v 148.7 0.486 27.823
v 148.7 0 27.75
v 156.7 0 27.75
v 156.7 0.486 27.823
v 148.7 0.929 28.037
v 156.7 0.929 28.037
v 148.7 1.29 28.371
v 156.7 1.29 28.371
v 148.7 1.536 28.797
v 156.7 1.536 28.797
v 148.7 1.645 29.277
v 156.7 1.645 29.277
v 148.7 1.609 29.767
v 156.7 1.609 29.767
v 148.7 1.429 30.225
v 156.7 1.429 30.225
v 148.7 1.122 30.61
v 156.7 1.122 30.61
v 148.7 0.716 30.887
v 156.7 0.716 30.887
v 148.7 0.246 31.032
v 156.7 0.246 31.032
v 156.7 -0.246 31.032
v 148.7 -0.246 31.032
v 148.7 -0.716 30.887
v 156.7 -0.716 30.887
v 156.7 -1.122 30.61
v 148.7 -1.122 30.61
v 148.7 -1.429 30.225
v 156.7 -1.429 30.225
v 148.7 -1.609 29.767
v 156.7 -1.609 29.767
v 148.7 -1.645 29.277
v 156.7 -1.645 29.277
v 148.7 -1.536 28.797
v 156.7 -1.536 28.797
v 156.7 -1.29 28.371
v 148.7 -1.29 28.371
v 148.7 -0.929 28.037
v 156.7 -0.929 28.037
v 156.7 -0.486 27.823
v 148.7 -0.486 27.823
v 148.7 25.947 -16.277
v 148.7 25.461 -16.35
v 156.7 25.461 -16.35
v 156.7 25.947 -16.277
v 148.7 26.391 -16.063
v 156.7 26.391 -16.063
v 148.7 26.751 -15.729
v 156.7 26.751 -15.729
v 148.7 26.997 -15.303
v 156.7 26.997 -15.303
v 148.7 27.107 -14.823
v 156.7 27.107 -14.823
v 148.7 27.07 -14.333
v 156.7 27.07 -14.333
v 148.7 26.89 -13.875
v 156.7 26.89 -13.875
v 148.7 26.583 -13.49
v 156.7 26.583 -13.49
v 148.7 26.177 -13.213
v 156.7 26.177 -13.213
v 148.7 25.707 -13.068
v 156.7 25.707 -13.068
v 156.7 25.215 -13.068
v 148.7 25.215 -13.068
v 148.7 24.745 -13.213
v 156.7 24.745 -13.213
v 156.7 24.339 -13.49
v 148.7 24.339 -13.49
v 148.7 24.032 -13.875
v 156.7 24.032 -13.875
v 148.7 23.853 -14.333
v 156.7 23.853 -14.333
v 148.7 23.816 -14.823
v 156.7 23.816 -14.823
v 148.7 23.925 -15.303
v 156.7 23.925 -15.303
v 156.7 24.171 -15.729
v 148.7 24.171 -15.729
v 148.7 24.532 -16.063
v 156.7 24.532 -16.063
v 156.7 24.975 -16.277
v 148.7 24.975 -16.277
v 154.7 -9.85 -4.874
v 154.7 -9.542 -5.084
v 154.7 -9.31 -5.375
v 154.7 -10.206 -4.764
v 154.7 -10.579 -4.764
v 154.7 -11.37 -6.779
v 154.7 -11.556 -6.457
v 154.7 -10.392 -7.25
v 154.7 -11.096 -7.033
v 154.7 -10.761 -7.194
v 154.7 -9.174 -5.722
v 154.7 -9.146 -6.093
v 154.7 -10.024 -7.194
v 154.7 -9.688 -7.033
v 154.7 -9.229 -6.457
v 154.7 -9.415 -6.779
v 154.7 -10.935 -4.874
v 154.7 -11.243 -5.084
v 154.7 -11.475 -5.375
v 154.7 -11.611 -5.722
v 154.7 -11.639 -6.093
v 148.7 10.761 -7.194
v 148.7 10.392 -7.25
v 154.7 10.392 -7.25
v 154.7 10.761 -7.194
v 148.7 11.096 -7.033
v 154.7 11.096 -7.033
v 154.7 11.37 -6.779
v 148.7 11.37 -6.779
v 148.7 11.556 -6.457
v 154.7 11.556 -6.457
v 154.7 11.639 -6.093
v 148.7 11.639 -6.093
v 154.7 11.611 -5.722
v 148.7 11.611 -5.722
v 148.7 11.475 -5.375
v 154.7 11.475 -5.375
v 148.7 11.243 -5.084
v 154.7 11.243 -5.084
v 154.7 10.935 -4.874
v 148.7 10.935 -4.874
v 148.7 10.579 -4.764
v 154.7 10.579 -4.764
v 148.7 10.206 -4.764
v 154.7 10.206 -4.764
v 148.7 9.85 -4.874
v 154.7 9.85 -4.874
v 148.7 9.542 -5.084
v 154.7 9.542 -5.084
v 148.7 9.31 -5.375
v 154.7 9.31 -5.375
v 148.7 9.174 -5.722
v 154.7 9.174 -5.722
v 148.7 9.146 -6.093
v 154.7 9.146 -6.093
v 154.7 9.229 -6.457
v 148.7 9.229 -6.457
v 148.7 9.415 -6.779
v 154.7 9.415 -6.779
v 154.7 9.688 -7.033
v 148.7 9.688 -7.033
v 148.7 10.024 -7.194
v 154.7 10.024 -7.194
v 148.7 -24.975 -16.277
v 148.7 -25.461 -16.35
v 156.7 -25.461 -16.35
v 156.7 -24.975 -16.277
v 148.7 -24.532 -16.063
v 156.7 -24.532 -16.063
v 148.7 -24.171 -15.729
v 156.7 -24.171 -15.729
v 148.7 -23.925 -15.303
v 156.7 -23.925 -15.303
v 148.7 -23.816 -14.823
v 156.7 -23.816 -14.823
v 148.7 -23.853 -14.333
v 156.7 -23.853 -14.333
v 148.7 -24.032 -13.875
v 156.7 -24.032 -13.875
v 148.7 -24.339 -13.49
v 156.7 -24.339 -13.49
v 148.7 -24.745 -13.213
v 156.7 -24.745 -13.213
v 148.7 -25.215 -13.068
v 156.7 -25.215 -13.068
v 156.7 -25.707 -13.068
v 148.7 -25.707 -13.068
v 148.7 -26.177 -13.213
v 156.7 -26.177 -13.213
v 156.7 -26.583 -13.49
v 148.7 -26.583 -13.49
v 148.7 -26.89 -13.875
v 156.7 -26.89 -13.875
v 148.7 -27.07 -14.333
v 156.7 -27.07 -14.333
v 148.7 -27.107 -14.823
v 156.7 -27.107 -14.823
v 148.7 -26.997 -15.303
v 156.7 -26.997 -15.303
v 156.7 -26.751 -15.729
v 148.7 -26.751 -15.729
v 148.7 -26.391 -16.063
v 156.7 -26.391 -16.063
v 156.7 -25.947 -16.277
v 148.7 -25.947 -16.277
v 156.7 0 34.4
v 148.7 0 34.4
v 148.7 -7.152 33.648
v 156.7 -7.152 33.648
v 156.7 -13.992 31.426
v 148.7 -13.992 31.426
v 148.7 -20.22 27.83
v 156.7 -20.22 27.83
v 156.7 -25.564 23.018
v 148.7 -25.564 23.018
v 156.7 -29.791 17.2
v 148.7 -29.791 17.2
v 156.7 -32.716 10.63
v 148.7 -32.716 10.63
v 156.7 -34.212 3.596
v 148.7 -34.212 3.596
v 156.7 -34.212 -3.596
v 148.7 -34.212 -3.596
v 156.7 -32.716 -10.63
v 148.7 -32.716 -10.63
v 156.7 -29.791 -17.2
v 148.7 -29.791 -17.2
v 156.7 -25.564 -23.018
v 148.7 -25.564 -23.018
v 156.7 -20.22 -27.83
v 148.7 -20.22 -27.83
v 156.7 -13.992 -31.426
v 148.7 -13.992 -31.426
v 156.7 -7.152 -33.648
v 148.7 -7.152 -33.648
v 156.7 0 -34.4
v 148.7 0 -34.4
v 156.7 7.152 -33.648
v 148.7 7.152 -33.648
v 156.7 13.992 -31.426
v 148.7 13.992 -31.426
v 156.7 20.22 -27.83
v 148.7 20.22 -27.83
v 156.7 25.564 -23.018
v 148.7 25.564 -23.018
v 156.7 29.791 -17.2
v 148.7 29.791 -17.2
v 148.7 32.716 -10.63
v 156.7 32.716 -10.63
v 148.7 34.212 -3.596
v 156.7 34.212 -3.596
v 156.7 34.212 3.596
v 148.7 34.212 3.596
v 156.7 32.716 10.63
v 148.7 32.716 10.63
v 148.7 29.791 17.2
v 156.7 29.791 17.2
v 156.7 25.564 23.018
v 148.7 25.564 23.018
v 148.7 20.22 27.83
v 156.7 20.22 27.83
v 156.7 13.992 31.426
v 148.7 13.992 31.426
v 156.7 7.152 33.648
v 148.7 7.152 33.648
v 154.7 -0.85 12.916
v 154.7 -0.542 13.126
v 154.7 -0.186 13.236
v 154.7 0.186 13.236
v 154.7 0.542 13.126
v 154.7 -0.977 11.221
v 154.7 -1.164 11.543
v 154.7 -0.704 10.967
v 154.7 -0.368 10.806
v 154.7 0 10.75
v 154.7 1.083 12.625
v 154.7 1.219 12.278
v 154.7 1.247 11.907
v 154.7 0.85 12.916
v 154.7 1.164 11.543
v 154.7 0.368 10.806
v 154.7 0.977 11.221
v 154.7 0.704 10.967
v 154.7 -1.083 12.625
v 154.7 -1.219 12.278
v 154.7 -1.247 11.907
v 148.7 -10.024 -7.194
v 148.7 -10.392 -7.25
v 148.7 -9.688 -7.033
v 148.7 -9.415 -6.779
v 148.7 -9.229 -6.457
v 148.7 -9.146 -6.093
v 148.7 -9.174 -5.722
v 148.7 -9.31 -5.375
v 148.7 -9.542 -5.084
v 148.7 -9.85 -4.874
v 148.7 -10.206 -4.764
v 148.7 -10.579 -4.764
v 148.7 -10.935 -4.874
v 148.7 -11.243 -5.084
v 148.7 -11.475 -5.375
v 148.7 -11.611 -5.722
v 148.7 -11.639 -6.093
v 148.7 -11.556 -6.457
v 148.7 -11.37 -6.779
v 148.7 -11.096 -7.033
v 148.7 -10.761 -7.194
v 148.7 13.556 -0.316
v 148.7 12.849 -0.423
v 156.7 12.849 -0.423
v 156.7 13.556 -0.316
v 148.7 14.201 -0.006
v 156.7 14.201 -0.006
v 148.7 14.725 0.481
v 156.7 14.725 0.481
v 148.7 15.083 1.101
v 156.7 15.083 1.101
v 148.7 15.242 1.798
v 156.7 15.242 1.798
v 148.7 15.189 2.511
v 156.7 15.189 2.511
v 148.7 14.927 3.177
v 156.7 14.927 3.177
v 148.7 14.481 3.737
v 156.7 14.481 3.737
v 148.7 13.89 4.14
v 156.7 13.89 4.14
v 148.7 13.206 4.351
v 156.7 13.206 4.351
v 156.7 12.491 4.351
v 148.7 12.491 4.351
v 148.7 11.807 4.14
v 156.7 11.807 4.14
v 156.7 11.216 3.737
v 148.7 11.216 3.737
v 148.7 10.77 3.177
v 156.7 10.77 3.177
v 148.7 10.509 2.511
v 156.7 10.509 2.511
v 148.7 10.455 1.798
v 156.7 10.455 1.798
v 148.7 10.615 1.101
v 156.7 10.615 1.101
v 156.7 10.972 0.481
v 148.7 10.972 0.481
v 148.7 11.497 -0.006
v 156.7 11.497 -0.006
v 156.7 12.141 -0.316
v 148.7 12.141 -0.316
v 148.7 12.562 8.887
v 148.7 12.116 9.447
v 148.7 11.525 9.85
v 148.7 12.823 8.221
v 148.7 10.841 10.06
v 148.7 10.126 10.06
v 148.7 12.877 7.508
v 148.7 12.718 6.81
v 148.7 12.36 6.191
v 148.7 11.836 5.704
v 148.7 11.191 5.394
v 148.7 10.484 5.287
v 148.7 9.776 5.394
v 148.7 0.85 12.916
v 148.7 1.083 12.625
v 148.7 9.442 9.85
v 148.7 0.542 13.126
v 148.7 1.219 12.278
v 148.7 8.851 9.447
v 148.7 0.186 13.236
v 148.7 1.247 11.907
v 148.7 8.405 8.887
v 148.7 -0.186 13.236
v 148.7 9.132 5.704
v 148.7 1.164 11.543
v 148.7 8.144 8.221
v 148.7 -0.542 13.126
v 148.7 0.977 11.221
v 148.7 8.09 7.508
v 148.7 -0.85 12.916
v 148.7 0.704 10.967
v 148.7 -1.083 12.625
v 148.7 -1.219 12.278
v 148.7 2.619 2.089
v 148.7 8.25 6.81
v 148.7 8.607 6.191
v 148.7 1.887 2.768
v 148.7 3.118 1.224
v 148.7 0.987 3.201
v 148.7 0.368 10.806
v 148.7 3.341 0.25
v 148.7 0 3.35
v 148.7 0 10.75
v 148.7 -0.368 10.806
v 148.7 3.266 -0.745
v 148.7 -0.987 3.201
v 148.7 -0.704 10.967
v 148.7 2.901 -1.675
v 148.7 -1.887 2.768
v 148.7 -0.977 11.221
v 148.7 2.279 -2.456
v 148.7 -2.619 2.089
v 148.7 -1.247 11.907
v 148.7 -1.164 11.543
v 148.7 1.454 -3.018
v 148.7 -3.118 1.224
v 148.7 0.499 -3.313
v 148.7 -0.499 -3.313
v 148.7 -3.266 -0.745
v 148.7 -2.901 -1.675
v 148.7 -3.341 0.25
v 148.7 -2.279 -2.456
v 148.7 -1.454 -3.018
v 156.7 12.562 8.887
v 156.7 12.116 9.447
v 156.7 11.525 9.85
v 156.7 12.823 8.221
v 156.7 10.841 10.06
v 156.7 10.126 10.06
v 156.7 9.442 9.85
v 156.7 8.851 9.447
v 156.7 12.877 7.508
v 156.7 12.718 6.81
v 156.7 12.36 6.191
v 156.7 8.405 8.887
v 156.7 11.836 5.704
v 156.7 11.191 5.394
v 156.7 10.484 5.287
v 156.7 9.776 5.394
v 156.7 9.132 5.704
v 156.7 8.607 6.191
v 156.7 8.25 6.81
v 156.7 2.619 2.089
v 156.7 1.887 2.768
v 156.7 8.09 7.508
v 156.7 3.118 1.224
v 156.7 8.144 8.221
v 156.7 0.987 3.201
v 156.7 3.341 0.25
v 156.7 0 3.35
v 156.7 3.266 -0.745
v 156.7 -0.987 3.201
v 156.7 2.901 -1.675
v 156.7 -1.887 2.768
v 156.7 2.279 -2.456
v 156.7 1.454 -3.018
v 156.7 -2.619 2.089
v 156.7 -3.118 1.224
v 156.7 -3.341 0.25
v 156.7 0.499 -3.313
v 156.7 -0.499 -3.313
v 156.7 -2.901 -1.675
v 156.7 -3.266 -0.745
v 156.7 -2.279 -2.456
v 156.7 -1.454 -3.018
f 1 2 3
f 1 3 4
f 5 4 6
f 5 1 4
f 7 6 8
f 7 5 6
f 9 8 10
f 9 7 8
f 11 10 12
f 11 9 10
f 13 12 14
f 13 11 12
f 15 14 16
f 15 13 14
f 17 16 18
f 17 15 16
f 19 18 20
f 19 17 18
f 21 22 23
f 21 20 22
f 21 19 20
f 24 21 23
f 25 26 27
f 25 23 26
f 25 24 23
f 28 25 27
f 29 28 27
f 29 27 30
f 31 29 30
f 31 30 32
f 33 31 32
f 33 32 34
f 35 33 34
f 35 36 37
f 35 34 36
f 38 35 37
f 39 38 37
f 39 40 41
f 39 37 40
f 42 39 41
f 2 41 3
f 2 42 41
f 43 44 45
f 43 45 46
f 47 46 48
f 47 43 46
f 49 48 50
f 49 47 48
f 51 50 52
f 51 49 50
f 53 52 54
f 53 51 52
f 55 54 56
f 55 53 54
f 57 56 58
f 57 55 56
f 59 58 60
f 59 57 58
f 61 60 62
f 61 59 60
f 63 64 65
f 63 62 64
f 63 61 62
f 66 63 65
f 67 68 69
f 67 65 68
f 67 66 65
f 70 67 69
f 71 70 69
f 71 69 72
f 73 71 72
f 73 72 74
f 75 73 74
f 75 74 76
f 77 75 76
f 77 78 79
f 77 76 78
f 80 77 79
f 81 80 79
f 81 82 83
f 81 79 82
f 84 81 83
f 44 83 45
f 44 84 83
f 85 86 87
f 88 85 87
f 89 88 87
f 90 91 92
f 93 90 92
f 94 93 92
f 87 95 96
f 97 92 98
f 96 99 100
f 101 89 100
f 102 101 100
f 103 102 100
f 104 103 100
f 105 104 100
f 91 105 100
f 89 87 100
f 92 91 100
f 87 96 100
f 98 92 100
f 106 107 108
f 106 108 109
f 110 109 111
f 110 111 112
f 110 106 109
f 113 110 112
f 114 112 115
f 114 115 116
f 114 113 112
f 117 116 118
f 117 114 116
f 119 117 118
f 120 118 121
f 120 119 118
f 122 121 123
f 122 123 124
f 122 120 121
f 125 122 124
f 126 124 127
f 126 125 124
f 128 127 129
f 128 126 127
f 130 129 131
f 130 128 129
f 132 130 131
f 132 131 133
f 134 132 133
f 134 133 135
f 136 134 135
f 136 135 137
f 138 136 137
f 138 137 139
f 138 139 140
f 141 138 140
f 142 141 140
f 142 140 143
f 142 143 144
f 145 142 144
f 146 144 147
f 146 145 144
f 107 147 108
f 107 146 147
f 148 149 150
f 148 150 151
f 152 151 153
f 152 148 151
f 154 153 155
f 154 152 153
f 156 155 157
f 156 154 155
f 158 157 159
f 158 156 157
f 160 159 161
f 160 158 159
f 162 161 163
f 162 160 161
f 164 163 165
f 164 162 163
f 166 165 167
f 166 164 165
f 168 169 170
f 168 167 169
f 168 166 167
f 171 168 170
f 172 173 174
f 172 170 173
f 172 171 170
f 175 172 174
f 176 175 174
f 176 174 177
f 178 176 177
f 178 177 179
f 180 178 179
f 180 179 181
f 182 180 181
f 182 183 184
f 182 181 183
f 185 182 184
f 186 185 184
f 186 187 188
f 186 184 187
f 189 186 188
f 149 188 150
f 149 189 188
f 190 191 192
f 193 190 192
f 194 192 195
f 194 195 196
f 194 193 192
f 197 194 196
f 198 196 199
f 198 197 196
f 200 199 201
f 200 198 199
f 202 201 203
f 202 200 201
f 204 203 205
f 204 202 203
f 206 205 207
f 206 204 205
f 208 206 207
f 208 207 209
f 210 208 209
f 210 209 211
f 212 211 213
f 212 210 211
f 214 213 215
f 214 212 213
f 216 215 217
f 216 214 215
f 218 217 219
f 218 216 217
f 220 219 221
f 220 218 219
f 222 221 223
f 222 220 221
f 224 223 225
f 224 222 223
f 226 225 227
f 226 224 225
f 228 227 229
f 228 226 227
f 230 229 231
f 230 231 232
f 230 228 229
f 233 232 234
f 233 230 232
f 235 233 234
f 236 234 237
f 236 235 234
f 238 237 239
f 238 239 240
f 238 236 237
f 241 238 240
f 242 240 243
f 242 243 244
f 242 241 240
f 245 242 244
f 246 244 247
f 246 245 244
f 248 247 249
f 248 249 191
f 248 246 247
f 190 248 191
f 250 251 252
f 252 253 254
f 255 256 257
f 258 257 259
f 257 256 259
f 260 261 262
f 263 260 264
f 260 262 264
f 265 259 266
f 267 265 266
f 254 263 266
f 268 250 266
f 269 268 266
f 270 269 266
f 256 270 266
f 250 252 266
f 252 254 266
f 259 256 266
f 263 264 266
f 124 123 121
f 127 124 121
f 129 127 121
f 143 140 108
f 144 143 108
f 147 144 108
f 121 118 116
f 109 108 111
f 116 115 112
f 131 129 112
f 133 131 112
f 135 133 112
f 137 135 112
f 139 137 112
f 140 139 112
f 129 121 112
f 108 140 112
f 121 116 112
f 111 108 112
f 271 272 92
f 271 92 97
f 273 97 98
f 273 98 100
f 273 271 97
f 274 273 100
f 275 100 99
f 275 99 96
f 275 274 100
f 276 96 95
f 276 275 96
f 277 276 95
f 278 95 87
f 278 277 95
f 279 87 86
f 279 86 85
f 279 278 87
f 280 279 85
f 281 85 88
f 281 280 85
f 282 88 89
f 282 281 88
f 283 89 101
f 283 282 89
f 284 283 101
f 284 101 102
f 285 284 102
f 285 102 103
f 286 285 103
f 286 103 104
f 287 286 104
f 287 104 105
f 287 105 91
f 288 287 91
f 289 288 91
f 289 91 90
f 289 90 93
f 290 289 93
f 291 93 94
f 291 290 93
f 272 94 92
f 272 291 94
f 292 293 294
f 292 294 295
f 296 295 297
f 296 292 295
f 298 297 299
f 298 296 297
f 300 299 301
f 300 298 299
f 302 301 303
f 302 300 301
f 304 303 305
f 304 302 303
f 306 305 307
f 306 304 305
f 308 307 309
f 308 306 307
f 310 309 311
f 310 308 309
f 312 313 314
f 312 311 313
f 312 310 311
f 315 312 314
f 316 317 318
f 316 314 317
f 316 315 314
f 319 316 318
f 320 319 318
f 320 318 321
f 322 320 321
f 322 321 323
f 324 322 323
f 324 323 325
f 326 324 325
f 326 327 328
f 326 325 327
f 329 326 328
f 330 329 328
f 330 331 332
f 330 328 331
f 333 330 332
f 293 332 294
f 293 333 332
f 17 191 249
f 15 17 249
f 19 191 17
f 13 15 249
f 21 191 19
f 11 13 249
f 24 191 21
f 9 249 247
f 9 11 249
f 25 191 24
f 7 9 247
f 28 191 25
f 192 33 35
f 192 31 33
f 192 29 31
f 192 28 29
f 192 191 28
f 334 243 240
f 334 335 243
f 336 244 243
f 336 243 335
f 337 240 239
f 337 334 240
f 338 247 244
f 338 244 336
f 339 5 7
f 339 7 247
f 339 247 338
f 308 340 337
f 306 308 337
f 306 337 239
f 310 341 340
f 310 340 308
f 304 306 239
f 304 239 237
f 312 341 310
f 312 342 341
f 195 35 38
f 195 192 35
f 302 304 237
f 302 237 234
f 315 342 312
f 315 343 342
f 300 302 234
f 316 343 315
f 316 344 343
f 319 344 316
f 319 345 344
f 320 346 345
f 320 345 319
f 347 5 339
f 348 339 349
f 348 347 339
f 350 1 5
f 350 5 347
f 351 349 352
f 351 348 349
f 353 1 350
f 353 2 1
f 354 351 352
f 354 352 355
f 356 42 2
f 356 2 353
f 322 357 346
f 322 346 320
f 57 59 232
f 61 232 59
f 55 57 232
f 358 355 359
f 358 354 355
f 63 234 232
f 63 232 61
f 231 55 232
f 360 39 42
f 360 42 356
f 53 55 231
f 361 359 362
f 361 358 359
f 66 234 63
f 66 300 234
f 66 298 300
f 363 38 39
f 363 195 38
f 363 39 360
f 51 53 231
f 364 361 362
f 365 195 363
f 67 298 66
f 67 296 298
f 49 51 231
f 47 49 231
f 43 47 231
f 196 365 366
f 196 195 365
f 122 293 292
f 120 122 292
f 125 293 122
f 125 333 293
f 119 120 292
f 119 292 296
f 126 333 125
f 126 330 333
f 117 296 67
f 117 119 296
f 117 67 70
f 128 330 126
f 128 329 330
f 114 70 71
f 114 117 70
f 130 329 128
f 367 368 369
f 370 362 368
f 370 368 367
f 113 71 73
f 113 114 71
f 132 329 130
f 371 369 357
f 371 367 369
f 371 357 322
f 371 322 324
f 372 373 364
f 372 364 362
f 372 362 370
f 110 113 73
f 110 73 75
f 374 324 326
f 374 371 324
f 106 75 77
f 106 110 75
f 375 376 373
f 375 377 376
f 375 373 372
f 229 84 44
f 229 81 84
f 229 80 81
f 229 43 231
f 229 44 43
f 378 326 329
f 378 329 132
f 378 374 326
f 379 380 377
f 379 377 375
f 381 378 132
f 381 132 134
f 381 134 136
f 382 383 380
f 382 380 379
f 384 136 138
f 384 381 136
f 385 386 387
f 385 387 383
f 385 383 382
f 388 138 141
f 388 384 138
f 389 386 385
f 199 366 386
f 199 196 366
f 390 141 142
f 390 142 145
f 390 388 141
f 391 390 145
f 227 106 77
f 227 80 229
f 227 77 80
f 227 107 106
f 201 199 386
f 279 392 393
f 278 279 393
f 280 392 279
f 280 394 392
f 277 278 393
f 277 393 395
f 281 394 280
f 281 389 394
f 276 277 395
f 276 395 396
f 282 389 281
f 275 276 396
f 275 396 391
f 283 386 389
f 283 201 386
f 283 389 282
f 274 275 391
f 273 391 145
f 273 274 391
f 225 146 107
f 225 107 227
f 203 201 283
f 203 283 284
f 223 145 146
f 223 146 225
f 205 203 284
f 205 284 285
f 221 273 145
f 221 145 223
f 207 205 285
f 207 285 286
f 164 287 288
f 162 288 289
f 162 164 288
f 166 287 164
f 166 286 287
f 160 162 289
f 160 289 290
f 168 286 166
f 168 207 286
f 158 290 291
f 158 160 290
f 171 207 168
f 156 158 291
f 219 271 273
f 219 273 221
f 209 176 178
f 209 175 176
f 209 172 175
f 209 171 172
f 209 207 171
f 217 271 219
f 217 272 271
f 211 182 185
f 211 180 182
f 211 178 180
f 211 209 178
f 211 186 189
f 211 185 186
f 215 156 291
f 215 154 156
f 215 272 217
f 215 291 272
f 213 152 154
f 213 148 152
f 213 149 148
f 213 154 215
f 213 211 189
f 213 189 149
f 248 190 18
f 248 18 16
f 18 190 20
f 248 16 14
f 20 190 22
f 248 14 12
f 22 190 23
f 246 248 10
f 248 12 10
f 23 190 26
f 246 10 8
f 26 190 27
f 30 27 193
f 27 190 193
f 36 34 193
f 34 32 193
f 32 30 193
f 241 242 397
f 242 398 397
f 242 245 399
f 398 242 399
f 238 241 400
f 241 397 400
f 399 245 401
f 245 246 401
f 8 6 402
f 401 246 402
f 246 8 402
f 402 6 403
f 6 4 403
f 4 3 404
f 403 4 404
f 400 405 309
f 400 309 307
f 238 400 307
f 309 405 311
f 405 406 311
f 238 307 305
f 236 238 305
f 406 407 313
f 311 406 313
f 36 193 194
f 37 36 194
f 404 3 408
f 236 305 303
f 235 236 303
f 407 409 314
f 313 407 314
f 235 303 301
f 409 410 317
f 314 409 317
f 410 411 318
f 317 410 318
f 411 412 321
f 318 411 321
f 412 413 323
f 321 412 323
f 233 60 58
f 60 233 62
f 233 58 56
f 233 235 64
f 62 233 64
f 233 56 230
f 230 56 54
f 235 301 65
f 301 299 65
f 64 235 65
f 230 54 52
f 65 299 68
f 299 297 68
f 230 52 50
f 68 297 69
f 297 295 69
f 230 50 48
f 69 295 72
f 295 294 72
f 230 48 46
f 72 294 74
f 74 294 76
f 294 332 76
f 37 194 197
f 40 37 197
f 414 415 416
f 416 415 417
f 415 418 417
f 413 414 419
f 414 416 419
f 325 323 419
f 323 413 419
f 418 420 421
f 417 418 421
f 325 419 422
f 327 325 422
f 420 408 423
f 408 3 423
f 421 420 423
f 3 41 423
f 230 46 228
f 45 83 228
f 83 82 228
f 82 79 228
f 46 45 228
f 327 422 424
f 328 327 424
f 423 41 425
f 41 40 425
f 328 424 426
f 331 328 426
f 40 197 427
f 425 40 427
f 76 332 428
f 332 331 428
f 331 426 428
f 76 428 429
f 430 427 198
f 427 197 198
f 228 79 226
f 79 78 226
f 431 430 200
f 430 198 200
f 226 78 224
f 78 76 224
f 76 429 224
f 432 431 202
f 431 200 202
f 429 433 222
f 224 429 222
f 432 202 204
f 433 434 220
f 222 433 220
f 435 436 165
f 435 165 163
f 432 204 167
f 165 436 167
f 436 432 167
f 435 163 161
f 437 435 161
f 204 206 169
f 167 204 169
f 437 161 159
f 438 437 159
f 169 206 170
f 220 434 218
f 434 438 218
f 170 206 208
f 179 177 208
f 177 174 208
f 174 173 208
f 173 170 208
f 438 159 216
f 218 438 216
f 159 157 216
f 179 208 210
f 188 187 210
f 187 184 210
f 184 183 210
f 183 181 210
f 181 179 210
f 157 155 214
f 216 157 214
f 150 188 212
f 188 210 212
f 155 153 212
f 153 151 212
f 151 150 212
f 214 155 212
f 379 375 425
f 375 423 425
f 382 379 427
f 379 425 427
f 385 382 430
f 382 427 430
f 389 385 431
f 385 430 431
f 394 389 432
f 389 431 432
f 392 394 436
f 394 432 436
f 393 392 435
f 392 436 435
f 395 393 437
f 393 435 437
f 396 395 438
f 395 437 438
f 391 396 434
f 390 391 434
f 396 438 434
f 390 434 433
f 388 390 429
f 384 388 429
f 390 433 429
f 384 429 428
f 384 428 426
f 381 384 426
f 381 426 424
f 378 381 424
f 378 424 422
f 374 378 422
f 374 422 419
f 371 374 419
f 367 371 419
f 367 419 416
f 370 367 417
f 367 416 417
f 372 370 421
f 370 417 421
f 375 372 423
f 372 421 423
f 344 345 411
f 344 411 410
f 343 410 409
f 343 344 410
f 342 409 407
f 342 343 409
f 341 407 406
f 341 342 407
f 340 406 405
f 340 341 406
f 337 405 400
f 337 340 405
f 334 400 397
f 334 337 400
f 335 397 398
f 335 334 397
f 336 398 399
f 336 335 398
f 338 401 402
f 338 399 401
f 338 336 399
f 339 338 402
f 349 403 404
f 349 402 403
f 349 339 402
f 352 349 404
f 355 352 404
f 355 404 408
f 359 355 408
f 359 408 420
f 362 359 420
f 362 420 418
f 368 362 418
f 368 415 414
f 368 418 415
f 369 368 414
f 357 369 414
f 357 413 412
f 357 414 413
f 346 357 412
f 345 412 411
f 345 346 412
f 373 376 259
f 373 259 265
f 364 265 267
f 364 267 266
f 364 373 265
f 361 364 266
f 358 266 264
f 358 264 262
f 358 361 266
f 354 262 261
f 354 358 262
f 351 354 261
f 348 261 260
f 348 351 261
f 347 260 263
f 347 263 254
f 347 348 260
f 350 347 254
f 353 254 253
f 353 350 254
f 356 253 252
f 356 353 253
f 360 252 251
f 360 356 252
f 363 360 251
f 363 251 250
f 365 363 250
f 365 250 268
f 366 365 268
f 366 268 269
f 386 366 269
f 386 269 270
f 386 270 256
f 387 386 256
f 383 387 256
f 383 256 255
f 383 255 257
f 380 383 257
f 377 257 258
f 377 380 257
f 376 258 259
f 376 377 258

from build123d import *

# Parameters (mm, degrees)
AXIAL_PROFILE_MM_W     = 8
AXIAL_PROFILE_MM_H     = 31.05
AXIAL_HOLES_DEPTH      = 165.078060691
AXIAL_HOLES_DEPTH_BACK = 165.078060691
SKETCH2_R              = 2.4
SKETCH2_R_2            = 1.65
CUT_EXTRUDE2_START     = 148.7
SKETCH3_R              = 1.25
CUT_EXTRUDE2_DEPTH     = 6


with BuildPart() as part:
    # Axial profile (mm) → Full revolution (revolve)
    with BuildSketch(Plane.XY, mode=Mode.PRIVATE) as full_revolution_sk:
        with Locations((152.7, 18.875)):
            Rectangle(AXIAL_PROFILE_MM_W, AXIAL_PROFILE_MM_H)
    revolve(full_revolution_sk.sketch.rotate(Axis((-110, 0, 0), (1, 0, 0)), 90), axis=Axis((-110, 0, 0), (1, 0, 0)))

    # Sketch2 → Axial holes (cut, two sides: drawn at the far end of the back side and taken through both)
    with BuildSketch(Plane(origin=(0, 0, 0), x_dir=(0, 0, -1), z_dir=(1, 0, 0)).offset(-AXIAL_HOLES_DEPTH_BACK)):
        with Locations((-1.977382665, 12.848733704)):
            Circle(SKETCH2_R)
        with Locations((-7.687206041, 10.483647423)):
            Circle(SKETCH2_R)
        with Locations((-29.4, 0)):
            Circle(SKETCH2_R_2)
        with Locations((14.7, -25.461146871)):
            Circle(SKETCH2_R_2)
        with Locations((14.7, 25.461146871)):
            Circle(SKETCH2_R_2)
    extrude(amount=AXIAL_HOLES_DEPTH + AXIAL_HOLES_DEPTH_BACK, mode=Mode.SUBTRACT)

    # Sketch3 → Cut-Extrude2 (cut)
    with BuildSketch(Plane(origin=(0, 0, 0), x_dir=(0, 0, -1), z_dir=(1, 0, 0)).offset(CUT_EXTRUDE2_START)):
        with Locations((-12, 0)):
            Circle(SKETCH3_R)
        with Locations((6, -10.392304845)):
            Circle(SKETCH3_R)
        with Locations((6, 10.392304845)):
            Circle(SKETCH3_R)
    extrude(amount=CUT_EXTRUDE2_DEPTH, mode=Mode.SUBTRACT)


solid = part.part
